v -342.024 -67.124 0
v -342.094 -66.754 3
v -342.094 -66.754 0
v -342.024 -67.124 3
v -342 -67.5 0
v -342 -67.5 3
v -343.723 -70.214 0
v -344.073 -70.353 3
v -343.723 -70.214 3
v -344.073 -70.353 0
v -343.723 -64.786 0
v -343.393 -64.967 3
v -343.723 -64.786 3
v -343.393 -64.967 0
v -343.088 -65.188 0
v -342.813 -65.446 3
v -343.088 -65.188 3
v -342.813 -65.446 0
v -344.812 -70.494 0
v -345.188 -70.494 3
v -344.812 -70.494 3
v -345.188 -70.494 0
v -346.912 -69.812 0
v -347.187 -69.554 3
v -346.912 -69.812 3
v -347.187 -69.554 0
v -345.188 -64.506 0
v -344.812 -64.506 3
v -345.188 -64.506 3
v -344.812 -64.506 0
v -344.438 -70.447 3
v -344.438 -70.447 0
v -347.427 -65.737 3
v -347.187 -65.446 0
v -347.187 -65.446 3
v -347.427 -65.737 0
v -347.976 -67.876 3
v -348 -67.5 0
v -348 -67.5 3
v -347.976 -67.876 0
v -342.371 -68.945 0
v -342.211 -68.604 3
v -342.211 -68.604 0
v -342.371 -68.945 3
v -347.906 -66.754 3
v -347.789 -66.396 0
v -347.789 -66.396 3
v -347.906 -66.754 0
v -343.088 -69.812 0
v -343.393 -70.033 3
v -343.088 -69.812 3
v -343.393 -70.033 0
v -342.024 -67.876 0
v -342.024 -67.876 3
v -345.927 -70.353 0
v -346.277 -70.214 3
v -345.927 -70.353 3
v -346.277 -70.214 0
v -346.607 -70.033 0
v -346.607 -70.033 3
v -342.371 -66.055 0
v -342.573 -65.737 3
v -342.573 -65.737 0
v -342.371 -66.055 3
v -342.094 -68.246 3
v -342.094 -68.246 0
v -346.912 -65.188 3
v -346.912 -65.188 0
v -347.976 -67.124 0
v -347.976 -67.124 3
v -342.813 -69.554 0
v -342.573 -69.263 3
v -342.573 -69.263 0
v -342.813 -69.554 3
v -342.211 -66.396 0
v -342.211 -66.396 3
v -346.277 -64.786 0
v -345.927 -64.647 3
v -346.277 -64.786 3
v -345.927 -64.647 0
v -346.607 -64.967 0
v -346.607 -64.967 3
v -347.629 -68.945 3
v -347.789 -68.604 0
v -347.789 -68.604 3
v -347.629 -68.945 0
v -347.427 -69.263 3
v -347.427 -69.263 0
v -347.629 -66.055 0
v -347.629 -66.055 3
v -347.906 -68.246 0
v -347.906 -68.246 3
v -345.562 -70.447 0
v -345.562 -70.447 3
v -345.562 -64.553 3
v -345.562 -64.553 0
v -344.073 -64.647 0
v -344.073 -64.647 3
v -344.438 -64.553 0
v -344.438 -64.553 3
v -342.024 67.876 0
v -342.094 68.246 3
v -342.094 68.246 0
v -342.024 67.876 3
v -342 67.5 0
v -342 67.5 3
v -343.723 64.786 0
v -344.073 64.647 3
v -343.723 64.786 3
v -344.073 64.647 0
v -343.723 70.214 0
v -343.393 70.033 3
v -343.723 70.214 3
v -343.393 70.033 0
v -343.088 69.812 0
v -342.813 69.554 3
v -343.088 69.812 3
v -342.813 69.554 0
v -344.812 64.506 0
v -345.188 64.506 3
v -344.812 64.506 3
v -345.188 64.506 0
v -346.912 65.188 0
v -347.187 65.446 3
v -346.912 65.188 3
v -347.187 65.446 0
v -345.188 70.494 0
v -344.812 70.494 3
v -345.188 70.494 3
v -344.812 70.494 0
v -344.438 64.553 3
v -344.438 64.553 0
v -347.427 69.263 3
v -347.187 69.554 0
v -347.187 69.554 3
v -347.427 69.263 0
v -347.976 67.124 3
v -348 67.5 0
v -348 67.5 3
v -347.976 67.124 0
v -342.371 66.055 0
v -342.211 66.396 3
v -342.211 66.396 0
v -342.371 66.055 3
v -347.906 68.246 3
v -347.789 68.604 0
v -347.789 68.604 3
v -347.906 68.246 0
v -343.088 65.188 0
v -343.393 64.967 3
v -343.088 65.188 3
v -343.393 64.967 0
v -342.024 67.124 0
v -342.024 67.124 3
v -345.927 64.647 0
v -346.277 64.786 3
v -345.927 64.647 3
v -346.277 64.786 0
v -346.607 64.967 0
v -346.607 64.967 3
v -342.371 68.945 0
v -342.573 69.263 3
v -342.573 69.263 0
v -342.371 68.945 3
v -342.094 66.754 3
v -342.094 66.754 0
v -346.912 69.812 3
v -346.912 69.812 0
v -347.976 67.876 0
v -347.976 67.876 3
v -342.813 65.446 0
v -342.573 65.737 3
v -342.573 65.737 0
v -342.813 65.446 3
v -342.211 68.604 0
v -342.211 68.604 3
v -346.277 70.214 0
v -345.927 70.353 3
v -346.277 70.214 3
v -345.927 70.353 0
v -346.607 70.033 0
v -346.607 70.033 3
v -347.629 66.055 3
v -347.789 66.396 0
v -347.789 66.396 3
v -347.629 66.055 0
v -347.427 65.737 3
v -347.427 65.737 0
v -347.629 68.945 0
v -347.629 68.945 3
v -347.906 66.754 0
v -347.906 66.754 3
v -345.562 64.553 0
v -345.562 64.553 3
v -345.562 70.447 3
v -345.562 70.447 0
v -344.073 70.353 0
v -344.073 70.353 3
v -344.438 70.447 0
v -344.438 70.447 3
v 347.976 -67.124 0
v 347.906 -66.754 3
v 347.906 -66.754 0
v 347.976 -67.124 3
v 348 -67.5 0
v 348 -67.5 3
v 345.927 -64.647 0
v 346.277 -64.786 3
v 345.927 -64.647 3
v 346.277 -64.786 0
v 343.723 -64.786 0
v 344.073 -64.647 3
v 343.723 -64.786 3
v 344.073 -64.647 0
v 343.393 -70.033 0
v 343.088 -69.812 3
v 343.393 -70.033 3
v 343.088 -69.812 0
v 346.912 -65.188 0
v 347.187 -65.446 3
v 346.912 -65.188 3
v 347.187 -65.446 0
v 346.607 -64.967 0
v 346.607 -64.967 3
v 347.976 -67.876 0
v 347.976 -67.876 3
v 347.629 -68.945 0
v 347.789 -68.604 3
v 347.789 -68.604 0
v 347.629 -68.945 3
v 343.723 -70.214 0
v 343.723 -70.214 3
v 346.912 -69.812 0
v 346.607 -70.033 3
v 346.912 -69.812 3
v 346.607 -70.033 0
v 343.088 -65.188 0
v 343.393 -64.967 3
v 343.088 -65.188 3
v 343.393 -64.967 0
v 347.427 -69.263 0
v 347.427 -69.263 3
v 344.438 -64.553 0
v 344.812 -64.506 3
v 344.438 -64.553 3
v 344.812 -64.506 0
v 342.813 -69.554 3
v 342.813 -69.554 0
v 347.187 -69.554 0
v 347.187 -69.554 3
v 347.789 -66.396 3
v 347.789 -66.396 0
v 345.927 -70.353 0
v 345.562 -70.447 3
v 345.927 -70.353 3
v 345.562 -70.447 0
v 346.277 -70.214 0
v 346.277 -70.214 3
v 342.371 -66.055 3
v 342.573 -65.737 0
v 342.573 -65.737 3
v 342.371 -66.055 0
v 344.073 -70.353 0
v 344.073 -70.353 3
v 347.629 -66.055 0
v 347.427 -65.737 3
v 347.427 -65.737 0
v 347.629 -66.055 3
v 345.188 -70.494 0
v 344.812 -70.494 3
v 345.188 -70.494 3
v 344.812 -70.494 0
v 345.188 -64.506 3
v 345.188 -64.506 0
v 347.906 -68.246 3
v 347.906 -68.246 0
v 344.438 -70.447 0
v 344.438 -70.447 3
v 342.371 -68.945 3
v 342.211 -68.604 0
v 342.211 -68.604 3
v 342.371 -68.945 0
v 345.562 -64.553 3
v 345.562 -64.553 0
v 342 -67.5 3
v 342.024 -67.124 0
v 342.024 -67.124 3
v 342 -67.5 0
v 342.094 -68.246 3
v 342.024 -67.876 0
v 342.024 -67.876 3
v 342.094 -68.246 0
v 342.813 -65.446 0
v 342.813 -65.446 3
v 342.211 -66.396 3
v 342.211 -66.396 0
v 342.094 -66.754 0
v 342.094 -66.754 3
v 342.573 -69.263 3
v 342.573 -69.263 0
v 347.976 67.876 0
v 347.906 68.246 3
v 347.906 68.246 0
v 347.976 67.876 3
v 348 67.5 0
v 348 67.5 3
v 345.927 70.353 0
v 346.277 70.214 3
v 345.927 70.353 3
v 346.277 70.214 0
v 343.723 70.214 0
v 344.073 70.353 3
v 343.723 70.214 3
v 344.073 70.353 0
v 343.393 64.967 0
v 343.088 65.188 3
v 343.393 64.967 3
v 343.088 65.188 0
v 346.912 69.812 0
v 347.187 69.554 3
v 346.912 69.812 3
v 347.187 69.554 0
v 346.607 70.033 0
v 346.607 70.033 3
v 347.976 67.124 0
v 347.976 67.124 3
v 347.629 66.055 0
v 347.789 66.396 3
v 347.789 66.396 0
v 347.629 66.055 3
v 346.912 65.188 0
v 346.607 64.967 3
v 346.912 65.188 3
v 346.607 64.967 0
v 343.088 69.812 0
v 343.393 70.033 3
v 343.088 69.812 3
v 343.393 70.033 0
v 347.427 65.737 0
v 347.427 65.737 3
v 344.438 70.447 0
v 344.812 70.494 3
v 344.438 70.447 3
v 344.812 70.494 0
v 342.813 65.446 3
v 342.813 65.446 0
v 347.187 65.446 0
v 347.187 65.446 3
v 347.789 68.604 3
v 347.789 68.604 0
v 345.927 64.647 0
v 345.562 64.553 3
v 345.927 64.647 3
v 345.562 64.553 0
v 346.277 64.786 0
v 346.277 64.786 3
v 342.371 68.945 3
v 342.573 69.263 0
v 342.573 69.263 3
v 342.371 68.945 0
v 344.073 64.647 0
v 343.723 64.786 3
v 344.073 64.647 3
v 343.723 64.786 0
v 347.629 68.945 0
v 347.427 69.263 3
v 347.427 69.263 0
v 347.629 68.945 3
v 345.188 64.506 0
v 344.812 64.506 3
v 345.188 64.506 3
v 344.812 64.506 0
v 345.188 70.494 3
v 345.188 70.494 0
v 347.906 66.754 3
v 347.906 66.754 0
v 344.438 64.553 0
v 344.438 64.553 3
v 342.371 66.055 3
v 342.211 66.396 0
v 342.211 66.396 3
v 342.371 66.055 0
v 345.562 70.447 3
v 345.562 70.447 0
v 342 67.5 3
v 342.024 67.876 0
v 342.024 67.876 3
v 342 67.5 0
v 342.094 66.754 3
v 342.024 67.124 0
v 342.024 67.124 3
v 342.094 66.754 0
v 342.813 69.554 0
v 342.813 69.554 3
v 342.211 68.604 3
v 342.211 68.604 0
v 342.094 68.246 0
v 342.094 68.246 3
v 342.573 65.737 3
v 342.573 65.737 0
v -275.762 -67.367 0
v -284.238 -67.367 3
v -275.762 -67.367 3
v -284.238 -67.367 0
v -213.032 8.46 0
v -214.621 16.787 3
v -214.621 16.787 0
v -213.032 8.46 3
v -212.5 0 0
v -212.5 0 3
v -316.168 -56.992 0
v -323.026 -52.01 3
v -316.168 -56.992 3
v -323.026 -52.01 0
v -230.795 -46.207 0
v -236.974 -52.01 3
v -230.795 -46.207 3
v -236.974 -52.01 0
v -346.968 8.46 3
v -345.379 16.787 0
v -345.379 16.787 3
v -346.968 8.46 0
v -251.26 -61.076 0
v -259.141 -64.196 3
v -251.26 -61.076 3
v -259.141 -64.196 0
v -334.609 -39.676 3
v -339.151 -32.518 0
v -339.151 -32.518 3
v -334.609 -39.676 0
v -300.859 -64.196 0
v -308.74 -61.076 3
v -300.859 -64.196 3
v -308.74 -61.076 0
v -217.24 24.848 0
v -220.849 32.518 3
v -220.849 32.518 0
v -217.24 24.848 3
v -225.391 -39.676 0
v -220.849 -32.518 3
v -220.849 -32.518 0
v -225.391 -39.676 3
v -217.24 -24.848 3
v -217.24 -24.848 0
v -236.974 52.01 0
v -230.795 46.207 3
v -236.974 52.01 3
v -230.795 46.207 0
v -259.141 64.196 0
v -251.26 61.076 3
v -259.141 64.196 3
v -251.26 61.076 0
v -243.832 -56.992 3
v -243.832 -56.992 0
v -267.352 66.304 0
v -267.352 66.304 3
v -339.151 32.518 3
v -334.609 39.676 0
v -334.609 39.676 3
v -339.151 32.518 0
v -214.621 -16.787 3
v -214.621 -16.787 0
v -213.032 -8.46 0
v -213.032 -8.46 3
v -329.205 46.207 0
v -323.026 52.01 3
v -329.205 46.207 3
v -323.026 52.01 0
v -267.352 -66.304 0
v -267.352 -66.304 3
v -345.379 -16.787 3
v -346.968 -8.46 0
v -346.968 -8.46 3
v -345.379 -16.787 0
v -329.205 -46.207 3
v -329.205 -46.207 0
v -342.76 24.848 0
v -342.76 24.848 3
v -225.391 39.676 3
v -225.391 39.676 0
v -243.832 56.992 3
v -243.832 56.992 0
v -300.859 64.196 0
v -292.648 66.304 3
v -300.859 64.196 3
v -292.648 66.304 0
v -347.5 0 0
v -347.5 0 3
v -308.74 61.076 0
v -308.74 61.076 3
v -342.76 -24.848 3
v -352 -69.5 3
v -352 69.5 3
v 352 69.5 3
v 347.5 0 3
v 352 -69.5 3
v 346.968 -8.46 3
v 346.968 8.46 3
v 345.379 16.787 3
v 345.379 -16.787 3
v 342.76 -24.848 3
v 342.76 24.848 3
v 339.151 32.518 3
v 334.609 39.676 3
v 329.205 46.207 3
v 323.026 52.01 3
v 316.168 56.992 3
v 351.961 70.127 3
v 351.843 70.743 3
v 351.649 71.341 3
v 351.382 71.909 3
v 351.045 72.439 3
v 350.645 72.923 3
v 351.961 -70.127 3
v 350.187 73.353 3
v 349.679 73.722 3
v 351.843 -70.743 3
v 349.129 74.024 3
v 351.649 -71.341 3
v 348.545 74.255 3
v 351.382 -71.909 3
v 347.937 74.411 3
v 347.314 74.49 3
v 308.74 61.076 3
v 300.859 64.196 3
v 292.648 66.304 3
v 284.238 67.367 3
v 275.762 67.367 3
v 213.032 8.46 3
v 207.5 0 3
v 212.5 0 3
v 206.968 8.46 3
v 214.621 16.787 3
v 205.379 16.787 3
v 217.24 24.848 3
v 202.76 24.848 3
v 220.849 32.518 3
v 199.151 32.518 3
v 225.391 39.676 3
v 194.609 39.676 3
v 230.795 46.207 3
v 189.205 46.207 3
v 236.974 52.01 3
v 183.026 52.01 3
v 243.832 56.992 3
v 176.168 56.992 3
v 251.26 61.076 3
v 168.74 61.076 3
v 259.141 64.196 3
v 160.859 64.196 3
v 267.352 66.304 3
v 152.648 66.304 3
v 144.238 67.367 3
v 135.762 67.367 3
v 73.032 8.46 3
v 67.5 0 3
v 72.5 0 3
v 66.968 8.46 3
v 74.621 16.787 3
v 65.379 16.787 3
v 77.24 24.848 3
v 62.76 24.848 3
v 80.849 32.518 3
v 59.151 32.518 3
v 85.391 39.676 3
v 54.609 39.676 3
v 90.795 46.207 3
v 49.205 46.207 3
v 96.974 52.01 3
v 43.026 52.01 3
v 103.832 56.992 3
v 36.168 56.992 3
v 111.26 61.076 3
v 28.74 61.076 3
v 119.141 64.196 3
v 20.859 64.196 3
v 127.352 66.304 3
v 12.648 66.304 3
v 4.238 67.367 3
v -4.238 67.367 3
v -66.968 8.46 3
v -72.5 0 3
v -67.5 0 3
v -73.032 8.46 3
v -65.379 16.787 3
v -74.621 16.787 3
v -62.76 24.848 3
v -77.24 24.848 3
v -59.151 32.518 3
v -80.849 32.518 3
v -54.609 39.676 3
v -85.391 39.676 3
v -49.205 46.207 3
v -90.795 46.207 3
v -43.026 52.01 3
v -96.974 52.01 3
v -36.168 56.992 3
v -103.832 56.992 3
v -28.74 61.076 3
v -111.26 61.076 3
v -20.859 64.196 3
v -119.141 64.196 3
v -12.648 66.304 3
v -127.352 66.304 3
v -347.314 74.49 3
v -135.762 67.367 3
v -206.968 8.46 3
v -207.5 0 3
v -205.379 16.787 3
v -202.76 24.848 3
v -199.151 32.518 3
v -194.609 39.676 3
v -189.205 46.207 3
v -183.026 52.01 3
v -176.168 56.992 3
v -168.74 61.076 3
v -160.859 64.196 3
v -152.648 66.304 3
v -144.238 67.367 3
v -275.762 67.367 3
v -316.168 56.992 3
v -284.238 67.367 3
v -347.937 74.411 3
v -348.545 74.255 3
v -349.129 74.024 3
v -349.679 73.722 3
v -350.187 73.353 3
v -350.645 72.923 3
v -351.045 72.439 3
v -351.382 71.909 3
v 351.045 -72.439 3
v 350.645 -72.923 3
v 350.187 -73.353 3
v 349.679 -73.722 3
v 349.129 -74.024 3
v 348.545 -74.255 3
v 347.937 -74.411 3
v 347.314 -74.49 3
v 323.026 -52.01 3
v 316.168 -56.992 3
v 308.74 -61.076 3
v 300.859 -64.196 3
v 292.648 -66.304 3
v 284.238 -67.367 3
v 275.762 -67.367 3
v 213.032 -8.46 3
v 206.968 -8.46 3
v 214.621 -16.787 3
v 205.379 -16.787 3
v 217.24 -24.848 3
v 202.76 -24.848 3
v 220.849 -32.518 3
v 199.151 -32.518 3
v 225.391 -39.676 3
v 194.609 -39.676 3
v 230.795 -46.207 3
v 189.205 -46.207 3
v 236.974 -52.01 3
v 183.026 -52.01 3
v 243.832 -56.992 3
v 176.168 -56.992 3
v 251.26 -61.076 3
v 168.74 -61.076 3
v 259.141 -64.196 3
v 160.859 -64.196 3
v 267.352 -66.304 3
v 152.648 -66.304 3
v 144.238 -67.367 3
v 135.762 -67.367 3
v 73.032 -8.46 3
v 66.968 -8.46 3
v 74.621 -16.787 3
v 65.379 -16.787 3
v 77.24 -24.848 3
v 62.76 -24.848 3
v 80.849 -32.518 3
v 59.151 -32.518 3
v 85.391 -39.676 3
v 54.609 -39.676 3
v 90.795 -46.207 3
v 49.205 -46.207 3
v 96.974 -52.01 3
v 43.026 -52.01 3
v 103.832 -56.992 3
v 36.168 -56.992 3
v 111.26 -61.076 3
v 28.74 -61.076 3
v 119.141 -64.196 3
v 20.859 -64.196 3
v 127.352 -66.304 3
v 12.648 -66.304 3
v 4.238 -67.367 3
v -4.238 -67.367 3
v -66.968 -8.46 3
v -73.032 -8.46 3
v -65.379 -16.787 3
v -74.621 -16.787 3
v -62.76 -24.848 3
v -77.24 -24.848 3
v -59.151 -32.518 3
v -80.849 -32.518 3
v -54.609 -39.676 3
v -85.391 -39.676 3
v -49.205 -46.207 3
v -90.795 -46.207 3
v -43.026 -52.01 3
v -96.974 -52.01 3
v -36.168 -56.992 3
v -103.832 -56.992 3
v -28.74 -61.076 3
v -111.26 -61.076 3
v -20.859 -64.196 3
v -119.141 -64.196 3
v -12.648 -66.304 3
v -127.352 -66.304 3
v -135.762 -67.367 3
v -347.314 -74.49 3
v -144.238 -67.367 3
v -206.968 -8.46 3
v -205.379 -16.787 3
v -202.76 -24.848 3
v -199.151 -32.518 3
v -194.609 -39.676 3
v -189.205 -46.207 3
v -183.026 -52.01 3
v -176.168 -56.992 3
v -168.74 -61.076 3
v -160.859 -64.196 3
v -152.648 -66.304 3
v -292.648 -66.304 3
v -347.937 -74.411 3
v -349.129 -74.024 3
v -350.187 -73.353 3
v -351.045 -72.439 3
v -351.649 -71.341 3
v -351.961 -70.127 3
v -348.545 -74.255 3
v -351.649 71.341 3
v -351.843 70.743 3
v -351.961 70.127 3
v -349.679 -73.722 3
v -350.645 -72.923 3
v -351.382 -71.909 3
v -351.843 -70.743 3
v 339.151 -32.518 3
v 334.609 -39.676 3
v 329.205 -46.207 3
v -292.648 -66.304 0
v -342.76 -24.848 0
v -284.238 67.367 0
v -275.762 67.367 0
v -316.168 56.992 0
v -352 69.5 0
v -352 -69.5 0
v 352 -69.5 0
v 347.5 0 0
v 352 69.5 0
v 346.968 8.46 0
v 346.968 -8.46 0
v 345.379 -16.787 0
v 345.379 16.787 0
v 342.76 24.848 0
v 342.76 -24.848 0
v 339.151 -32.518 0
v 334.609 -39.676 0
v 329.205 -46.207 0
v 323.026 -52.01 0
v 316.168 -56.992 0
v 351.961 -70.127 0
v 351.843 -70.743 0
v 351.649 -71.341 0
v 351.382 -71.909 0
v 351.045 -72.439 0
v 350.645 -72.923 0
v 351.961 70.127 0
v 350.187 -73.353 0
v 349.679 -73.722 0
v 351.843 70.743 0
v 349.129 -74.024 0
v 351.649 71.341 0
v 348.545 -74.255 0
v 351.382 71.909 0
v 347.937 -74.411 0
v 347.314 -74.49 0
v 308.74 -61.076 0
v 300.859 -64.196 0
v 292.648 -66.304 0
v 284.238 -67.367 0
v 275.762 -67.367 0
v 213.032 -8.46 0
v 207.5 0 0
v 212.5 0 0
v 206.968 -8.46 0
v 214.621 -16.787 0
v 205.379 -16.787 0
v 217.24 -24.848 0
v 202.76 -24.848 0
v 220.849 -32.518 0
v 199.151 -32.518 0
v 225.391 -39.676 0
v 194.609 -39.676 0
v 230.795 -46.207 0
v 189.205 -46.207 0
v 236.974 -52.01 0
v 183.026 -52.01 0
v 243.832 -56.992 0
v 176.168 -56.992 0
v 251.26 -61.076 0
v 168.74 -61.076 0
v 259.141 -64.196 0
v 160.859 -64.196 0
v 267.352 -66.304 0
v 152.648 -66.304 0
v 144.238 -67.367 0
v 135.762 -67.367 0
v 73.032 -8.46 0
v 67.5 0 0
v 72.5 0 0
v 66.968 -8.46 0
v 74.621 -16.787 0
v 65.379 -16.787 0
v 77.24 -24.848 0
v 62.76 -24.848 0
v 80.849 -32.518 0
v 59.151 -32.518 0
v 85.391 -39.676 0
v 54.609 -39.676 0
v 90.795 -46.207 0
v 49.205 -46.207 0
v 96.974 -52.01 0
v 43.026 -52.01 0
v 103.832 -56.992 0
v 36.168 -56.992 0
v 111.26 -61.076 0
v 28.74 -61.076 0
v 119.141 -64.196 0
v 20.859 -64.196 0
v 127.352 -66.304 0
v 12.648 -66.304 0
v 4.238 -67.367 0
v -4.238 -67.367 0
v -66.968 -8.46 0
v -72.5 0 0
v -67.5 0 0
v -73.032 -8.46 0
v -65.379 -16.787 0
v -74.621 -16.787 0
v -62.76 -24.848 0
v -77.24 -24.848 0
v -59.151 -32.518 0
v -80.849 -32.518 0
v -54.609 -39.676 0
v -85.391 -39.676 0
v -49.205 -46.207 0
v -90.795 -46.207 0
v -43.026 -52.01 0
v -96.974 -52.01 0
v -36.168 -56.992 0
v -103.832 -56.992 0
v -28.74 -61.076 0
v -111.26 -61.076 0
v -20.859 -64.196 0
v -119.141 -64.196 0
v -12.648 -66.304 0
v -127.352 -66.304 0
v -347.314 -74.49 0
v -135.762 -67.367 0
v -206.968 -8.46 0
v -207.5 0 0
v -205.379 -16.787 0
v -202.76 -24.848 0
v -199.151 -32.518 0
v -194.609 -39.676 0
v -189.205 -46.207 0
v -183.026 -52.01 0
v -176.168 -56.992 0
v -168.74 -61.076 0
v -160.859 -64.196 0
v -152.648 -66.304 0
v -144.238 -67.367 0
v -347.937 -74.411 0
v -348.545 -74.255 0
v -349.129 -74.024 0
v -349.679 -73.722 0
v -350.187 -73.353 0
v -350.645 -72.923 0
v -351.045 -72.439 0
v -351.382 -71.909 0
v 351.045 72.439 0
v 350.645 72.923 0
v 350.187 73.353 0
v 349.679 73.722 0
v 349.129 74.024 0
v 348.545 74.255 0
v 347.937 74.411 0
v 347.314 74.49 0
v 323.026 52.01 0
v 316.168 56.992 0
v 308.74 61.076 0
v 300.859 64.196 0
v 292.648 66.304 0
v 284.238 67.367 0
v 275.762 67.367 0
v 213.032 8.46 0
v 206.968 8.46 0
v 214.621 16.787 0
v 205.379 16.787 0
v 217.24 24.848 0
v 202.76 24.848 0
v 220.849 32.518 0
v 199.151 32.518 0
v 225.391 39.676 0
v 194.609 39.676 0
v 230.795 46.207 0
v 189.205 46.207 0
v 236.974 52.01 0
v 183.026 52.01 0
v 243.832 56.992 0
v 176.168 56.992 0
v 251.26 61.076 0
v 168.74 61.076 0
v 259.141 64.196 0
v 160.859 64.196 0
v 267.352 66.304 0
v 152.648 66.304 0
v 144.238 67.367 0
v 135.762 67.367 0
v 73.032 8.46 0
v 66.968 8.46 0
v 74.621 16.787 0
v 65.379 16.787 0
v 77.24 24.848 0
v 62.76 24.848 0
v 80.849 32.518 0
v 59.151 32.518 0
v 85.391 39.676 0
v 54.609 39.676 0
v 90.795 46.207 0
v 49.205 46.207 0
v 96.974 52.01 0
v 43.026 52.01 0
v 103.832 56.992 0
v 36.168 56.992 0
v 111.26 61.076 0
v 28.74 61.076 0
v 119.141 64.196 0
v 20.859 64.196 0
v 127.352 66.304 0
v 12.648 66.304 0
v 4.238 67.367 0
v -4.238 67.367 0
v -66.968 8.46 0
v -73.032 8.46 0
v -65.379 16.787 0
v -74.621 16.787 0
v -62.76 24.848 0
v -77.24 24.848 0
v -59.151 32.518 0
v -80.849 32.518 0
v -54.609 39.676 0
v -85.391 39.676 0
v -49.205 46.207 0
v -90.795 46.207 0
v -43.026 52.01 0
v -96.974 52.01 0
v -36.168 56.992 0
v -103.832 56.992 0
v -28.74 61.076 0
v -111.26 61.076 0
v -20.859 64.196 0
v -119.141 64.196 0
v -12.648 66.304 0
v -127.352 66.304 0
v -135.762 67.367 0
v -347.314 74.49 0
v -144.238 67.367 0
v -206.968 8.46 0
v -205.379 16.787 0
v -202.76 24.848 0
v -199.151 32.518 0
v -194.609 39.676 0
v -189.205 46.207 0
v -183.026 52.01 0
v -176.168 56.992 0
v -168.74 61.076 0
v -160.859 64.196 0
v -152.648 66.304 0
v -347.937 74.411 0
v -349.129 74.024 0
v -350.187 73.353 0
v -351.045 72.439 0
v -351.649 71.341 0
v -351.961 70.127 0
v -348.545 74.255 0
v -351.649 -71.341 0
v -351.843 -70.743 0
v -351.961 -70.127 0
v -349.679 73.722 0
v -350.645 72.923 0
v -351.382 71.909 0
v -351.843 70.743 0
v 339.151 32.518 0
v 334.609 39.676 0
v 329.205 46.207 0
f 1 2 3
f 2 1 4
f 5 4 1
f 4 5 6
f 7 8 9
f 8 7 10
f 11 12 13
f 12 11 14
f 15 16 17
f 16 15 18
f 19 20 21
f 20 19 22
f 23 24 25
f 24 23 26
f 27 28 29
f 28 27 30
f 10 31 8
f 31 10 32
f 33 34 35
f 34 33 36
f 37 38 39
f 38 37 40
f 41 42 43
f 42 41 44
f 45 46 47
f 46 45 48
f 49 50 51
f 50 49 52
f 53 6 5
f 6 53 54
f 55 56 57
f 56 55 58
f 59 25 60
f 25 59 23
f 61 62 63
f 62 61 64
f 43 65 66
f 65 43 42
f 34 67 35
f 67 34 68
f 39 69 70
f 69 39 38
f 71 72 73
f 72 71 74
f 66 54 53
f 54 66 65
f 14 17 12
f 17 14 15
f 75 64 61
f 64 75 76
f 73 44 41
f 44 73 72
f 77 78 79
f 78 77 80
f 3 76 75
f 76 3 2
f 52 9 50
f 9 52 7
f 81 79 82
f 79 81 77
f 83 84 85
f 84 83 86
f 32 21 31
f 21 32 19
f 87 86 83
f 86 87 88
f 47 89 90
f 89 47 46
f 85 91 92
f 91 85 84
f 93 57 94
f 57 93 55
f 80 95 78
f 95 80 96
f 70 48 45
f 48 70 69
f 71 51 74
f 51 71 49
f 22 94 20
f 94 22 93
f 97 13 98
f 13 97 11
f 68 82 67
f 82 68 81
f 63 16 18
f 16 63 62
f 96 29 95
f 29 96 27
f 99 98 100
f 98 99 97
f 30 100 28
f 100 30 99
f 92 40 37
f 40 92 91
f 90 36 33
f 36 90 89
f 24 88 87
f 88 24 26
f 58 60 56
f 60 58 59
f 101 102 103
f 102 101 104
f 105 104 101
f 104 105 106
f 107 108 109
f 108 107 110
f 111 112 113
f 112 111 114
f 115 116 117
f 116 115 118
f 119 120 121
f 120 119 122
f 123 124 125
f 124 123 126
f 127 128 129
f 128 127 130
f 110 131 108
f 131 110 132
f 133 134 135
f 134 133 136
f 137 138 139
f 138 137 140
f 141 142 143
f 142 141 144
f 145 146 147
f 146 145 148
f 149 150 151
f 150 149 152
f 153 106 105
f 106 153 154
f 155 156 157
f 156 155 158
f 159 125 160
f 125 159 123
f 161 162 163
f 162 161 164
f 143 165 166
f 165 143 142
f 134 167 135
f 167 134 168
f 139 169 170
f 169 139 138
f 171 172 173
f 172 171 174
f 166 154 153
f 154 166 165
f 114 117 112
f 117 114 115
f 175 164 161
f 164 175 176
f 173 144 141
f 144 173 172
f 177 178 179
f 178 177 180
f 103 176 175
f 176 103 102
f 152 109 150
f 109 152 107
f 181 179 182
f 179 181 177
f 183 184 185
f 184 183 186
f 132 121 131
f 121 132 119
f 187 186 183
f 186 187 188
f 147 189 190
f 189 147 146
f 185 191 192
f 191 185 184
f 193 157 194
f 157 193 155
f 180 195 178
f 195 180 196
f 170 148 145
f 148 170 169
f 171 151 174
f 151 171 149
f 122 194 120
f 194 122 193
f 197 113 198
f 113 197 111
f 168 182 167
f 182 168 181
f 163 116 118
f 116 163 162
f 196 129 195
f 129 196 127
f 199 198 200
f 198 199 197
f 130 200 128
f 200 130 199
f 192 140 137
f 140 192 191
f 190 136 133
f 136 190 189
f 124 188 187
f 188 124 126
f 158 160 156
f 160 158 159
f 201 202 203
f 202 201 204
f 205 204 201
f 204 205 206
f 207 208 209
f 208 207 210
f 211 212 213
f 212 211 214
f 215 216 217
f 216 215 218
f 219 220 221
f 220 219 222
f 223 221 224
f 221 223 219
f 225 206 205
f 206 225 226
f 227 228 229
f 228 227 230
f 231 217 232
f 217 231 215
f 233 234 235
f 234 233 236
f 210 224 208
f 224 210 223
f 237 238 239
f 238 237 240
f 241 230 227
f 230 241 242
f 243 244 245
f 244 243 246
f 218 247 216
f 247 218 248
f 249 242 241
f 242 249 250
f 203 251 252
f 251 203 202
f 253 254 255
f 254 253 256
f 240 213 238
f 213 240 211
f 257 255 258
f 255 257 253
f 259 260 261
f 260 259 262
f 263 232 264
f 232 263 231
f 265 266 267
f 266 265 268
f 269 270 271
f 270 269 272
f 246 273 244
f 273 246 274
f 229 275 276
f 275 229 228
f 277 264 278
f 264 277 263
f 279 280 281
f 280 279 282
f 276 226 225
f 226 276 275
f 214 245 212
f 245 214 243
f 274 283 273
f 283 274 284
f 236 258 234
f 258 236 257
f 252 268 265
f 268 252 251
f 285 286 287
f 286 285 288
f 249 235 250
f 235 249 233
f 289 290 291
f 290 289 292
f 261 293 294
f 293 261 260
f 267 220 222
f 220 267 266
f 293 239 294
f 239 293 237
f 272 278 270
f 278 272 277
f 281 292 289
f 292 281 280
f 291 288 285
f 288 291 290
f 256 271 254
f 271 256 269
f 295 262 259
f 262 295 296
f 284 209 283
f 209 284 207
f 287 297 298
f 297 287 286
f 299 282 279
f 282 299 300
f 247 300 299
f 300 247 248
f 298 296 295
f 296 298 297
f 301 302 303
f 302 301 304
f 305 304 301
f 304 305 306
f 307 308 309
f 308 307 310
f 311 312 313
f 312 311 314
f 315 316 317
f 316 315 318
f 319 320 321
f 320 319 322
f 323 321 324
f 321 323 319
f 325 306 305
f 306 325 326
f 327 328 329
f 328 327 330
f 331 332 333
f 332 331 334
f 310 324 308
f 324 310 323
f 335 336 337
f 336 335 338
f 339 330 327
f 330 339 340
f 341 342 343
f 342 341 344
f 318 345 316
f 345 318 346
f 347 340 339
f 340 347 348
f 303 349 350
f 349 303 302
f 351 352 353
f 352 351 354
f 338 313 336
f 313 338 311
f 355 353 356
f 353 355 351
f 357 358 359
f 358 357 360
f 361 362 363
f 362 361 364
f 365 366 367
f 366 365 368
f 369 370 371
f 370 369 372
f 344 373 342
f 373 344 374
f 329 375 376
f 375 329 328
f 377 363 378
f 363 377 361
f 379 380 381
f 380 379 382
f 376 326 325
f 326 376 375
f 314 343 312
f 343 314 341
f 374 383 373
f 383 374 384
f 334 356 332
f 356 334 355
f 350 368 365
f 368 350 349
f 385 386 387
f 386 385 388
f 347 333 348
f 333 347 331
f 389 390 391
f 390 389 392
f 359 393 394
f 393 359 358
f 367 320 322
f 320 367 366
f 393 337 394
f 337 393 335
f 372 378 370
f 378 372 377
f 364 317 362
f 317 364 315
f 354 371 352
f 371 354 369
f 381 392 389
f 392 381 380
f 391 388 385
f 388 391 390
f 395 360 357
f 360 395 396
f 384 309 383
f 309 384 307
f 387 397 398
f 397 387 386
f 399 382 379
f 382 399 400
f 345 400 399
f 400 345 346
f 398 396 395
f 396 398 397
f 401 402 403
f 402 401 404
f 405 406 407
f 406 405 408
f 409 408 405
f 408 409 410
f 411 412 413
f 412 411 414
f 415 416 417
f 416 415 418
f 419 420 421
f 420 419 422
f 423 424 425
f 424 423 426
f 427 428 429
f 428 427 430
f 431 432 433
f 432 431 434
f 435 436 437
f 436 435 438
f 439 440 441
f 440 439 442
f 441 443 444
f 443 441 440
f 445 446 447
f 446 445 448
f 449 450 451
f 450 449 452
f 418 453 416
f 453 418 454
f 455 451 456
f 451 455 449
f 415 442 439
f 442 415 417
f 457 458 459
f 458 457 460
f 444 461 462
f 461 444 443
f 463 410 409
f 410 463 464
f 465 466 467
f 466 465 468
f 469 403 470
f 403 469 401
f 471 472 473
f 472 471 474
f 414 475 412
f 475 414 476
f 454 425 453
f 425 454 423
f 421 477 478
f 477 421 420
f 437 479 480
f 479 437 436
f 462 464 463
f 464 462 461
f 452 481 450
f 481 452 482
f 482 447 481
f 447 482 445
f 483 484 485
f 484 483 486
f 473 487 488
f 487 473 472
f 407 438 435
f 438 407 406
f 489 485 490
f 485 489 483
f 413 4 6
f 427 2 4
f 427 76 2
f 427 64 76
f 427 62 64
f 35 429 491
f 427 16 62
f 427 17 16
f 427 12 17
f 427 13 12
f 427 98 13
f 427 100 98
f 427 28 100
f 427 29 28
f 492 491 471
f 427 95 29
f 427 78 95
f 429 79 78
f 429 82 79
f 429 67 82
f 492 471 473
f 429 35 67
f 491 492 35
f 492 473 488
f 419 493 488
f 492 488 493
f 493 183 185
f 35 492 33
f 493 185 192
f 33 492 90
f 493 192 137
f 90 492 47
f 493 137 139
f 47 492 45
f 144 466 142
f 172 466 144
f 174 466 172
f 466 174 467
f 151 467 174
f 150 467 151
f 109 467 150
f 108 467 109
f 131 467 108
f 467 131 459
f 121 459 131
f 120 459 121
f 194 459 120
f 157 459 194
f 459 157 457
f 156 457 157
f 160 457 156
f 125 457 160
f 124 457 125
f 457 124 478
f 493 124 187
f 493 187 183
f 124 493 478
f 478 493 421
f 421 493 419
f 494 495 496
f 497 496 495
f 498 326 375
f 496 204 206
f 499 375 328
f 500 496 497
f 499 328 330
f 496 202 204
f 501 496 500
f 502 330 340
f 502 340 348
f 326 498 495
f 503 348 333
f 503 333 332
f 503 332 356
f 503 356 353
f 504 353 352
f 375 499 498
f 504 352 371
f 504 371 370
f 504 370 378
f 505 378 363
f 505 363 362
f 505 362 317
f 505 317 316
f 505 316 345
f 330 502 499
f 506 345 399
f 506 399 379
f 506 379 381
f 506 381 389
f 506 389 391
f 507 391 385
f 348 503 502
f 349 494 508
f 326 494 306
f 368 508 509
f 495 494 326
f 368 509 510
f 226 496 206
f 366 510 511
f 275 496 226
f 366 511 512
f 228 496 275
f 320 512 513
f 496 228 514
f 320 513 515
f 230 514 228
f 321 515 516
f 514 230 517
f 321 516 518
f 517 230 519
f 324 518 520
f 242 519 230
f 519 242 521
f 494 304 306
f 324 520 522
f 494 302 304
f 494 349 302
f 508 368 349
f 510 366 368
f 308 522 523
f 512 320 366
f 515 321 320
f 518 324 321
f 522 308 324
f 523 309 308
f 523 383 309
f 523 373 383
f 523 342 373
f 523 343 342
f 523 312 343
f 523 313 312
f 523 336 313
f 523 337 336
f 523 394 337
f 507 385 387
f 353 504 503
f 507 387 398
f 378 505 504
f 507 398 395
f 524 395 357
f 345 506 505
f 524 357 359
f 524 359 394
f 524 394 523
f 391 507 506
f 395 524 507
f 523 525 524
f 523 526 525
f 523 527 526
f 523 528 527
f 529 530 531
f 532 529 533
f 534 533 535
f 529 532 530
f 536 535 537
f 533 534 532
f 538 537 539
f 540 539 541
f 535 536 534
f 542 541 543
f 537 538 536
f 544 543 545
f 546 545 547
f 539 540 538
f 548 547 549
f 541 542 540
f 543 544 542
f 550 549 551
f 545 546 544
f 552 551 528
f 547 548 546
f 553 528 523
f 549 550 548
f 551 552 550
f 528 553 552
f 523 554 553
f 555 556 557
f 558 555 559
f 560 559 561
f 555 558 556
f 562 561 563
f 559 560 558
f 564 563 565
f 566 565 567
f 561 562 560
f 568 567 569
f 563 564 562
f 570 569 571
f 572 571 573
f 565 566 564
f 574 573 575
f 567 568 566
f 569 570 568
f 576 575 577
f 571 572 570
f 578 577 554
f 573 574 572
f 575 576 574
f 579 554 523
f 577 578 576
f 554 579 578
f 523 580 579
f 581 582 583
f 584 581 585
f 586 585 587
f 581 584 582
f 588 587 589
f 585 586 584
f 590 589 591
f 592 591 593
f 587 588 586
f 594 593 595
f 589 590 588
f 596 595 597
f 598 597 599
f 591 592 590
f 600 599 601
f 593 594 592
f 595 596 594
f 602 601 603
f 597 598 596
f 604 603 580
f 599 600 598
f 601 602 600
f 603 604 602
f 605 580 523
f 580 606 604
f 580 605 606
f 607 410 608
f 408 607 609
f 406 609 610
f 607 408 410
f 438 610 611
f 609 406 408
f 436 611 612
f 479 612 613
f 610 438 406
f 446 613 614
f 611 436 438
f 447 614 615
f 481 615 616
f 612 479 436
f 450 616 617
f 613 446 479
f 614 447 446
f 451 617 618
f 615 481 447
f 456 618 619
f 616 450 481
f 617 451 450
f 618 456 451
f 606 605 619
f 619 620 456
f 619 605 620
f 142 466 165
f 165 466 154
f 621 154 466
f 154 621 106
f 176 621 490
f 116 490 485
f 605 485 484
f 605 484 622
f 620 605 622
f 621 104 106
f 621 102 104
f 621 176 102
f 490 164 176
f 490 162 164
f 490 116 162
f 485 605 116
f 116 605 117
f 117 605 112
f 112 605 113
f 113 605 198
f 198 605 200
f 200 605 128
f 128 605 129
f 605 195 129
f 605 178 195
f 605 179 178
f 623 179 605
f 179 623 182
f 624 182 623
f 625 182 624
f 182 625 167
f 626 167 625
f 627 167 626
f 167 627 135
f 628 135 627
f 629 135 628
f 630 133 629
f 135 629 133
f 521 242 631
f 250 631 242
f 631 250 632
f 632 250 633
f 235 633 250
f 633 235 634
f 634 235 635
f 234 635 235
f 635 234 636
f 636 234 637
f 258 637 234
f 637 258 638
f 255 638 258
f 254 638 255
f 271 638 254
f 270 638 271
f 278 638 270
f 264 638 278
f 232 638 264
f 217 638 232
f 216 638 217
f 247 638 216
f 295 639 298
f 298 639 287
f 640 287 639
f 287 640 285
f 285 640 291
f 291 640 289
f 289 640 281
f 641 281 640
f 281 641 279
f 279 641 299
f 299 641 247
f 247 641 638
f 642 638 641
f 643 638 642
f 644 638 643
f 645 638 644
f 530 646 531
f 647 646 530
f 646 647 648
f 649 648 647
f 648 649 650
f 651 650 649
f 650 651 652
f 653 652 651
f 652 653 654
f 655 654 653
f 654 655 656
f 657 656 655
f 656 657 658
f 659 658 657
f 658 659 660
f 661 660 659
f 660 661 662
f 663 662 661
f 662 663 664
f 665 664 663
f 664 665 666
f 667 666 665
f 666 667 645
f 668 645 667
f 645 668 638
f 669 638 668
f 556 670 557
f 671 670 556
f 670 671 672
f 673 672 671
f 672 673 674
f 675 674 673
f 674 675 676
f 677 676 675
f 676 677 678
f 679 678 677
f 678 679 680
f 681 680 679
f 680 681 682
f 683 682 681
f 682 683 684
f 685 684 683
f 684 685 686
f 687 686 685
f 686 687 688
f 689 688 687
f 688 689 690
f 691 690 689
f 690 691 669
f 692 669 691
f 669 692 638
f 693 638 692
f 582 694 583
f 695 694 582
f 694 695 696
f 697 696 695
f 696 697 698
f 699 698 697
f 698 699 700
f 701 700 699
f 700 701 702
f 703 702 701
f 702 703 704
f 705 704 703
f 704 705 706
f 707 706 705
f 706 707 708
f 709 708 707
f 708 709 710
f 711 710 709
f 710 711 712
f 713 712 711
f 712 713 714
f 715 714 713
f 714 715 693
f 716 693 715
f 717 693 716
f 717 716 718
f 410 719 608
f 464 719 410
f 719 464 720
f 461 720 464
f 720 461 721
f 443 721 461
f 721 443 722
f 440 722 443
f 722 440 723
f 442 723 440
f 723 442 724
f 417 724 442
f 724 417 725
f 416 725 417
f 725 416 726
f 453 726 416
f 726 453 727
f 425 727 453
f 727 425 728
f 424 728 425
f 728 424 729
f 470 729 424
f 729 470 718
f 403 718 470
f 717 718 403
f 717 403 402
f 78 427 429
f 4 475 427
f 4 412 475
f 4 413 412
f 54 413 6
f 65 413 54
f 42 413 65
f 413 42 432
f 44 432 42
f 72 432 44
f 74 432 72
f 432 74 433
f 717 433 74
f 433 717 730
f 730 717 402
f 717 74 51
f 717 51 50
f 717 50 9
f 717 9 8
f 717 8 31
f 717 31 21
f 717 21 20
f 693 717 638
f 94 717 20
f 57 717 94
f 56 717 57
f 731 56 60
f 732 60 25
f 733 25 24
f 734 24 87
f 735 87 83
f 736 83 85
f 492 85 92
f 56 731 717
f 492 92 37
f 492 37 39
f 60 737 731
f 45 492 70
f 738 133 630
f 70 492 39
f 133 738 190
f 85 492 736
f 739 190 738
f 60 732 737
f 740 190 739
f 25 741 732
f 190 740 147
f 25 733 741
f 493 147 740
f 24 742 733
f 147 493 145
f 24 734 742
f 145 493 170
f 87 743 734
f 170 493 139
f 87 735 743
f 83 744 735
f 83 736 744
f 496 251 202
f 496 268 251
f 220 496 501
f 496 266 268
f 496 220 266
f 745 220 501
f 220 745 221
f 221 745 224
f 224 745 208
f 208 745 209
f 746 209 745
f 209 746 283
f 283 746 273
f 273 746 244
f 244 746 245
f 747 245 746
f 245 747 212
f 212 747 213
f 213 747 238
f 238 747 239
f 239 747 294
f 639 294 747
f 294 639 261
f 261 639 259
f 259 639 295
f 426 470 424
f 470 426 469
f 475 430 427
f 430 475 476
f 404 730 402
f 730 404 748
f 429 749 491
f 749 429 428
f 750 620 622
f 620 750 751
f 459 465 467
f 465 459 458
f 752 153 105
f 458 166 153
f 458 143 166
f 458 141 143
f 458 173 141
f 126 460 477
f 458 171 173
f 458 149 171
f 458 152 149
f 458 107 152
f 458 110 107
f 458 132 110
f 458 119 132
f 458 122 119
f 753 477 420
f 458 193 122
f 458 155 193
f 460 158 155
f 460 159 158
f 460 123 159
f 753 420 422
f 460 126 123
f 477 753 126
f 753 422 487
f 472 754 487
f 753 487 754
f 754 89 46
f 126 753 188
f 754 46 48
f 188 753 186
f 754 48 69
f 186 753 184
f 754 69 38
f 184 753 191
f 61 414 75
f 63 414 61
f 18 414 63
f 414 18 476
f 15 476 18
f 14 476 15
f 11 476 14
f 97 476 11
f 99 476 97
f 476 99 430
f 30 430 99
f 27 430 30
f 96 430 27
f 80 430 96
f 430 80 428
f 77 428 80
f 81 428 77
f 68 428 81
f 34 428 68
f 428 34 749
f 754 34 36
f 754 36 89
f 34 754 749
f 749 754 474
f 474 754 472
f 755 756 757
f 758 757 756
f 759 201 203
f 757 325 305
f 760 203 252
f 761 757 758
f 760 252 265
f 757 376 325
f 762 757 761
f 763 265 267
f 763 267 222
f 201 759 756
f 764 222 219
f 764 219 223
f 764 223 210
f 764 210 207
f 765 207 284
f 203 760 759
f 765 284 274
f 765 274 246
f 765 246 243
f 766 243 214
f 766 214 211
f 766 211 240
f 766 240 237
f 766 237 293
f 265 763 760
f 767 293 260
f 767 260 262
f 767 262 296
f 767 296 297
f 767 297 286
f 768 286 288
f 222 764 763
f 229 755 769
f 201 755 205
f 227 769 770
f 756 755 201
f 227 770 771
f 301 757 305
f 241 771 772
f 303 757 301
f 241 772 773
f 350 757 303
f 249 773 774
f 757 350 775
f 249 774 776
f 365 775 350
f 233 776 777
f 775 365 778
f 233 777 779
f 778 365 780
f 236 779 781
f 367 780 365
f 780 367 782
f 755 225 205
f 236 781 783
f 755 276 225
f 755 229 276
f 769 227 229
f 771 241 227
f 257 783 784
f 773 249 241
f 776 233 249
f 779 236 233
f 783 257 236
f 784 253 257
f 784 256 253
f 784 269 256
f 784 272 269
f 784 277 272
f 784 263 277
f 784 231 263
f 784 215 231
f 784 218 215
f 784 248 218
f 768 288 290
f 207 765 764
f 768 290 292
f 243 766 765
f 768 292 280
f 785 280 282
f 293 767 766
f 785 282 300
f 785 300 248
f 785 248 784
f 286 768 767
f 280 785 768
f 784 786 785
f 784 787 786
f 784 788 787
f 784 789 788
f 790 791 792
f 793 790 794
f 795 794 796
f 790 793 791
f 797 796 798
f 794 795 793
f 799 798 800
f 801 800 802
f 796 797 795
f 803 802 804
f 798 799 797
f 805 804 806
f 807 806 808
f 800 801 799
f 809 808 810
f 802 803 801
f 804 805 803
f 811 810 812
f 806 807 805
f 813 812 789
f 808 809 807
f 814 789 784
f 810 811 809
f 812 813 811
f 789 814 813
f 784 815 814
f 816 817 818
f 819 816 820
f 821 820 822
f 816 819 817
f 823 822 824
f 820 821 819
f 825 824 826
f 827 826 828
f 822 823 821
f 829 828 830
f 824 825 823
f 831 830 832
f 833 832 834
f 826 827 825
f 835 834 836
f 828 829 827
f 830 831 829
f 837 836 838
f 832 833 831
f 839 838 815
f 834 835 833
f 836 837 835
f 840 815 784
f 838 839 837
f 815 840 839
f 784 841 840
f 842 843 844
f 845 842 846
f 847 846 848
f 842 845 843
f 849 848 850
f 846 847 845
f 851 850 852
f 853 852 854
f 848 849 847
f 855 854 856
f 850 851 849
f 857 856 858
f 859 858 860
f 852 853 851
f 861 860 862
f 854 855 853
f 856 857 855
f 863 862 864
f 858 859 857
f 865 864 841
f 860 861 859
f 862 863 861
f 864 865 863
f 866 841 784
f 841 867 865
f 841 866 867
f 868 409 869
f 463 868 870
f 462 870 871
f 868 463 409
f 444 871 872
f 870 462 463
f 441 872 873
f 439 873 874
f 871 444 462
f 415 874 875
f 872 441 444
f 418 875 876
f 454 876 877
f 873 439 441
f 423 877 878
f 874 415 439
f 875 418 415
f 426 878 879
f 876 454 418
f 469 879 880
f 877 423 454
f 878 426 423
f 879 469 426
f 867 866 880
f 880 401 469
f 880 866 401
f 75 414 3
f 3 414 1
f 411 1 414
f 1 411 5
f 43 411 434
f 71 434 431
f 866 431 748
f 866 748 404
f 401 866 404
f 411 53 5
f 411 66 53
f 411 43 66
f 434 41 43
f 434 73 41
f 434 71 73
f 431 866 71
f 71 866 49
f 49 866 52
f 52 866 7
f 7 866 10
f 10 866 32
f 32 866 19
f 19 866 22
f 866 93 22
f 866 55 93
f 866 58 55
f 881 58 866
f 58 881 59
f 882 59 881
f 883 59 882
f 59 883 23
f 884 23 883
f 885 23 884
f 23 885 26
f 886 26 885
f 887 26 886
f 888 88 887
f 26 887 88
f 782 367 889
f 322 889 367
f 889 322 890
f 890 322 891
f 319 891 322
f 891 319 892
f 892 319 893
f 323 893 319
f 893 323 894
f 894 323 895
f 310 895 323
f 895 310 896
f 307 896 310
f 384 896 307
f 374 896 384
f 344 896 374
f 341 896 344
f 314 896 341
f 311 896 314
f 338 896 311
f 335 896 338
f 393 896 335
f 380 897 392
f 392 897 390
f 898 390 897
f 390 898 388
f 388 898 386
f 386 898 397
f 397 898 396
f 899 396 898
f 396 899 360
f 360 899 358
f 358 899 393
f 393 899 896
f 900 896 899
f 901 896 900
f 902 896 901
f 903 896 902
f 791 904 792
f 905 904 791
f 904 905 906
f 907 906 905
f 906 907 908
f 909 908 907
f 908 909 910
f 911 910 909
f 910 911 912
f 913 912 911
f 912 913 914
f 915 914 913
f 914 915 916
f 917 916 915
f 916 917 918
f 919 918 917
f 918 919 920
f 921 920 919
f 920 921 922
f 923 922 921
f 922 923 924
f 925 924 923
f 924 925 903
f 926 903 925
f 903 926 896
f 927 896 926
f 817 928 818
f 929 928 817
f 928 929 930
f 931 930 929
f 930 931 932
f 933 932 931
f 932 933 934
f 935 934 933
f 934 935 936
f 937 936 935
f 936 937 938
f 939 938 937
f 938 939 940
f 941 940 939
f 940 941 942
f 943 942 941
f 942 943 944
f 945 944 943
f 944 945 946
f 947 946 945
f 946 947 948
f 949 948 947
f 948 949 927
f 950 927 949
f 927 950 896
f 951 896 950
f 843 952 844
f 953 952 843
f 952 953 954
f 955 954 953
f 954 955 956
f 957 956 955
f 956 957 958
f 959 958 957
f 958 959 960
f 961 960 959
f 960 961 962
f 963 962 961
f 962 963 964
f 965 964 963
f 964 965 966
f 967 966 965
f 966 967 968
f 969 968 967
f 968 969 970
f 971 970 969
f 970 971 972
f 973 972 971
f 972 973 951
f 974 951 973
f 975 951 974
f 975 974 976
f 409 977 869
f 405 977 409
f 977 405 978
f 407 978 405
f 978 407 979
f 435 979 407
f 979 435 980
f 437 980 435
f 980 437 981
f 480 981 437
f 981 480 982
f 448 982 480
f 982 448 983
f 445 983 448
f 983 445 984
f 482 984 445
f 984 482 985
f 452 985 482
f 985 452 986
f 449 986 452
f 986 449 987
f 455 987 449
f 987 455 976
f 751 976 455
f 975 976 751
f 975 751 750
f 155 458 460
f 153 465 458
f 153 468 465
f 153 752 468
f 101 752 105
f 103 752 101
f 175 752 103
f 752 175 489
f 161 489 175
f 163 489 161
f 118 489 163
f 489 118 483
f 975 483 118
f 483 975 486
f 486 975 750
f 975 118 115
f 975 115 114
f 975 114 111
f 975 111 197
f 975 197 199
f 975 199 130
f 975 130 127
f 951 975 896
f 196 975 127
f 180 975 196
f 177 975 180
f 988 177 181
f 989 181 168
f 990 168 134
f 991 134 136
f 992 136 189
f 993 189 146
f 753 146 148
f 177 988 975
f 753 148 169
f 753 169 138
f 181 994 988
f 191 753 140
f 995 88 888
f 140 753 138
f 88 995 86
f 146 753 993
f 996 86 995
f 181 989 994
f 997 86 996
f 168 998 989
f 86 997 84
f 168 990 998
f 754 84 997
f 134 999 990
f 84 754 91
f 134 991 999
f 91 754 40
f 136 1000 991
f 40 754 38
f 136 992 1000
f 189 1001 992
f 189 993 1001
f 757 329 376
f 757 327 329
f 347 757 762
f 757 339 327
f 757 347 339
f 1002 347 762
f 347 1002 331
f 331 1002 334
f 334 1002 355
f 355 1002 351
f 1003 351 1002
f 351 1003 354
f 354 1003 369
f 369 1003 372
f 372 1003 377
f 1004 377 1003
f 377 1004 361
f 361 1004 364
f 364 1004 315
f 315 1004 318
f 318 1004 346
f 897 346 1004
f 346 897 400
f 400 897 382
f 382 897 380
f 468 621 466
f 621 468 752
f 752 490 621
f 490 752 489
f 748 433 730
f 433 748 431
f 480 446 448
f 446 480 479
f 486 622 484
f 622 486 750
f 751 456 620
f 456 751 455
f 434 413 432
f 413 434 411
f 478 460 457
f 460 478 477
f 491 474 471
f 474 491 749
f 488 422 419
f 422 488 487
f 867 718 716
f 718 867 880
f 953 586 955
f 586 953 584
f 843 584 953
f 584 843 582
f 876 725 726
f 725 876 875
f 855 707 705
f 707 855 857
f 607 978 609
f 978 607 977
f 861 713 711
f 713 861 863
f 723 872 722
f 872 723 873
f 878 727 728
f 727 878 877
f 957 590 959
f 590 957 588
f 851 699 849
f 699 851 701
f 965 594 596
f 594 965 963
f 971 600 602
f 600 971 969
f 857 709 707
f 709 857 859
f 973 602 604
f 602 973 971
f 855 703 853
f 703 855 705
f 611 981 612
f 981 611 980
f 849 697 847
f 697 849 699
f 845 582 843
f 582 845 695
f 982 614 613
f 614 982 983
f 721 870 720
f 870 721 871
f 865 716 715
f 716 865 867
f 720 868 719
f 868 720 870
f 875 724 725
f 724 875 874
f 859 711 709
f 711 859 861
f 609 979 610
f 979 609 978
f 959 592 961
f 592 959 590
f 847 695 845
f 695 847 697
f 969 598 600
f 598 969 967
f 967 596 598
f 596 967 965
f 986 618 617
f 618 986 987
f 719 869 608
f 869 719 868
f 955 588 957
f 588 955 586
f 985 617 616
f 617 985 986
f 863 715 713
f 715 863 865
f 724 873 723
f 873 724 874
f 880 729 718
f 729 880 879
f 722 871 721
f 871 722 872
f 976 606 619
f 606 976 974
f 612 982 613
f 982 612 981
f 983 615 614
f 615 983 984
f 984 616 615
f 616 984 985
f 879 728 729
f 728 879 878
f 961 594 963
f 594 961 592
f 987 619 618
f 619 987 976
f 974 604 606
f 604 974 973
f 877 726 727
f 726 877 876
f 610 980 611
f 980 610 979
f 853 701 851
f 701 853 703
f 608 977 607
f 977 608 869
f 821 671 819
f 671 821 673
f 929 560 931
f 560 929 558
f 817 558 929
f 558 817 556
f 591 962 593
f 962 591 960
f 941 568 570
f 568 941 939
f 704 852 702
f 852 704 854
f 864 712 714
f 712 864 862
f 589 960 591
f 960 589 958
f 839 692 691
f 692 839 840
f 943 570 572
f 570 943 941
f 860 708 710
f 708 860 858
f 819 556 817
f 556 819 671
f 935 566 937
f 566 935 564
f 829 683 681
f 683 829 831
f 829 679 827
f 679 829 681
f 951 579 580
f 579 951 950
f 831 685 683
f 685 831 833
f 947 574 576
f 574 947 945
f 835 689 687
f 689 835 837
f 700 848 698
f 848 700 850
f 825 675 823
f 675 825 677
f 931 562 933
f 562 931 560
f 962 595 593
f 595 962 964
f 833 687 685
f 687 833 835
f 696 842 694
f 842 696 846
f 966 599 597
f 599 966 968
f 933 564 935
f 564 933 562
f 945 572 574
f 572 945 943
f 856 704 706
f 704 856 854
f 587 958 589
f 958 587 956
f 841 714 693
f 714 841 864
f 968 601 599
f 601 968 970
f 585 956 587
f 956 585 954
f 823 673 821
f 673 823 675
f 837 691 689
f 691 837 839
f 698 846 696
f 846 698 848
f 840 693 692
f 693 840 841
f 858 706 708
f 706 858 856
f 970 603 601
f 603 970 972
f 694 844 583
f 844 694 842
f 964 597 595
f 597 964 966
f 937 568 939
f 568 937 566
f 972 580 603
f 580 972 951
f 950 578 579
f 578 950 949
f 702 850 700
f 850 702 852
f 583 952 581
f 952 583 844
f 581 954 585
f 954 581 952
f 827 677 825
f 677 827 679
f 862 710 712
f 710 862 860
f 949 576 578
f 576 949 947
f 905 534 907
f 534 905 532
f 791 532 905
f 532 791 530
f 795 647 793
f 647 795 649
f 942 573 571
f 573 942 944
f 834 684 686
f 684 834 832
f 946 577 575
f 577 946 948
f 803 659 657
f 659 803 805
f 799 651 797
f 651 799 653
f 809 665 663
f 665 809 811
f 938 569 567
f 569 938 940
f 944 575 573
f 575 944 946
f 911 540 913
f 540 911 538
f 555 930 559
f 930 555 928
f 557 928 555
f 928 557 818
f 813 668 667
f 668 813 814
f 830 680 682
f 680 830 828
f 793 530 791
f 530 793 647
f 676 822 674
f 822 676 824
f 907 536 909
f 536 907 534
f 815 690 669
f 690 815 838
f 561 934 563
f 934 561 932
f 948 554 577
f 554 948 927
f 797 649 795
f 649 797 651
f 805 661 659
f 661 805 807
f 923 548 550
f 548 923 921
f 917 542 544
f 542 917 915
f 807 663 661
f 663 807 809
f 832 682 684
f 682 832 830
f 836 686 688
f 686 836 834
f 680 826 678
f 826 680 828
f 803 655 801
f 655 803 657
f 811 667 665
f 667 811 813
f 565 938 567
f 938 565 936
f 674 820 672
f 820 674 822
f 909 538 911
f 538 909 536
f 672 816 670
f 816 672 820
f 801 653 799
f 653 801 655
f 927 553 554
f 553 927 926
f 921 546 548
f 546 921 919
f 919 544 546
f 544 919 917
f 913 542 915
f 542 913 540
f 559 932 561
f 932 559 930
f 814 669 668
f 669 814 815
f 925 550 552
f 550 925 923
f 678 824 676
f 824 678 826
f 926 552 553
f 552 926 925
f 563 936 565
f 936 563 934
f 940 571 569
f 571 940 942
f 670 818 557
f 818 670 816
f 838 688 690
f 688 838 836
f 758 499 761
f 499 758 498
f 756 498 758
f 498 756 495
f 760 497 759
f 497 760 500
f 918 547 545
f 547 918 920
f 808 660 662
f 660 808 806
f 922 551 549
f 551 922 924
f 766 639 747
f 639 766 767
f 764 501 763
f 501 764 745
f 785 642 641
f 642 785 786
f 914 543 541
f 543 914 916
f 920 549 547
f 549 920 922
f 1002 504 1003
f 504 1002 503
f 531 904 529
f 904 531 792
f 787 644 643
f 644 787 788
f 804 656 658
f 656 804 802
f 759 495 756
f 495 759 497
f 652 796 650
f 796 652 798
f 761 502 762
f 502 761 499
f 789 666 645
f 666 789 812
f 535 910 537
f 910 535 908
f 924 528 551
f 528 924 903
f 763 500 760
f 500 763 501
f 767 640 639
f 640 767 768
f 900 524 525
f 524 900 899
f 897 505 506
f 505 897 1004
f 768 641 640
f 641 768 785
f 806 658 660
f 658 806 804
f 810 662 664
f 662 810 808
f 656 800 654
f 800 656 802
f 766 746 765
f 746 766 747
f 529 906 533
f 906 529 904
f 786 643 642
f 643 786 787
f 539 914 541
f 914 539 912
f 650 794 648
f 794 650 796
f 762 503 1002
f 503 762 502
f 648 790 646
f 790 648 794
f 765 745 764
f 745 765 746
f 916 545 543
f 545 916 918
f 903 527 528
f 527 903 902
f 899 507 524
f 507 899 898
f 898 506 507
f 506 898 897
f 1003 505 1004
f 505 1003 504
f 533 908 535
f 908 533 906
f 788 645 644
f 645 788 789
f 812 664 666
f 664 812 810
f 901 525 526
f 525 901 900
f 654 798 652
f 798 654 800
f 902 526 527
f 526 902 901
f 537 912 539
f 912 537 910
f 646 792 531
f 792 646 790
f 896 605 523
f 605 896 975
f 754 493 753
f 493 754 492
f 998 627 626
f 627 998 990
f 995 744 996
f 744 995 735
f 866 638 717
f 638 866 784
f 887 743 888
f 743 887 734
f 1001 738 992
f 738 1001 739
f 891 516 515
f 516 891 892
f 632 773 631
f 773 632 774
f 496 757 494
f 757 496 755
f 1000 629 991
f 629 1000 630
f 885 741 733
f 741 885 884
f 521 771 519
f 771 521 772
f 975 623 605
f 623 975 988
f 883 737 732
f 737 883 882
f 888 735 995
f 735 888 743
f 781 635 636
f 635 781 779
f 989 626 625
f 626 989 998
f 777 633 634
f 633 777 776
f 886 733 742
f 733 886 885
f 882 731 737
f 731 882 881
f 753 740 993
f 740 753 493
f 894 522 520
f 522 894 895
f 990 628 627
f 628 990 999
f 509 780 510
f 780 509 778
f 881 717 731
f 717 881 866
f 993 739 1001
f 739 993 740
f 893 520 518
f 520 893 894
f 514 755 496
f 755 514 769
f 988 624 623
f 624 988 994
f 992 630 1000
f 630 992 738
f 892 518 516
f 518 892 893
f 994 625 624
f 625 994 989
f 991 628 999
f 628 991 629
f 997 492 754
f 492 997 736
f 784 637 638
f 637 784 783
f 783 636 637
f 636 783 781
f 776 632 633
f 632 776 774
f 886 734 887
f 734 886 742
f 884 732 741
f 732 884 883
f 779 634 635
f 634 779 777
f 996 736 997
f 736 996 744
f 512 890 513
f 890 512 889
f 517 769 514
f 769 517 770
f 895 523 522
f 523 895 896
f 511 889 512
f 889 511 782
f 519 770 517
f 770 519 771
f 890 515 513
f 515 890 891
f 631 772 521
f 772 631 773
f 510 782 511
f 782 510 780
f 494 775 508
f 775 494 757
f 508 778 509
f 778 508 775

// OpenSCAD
$fn = 50;


difference() {
	union() {
		hull() {
			translate(v = [-347.0000000000, 69.5000000000, 0]) {
				cylinder(h = 3, r = 5);
			}
			translate(v = [347.0000000000, 69.5000000000, 0]) {
				cylinder(h = 3, r = 5);
			}
			translate(v = [-347.0000000000, -69.5000000000, 0]) {
				cylinder(h = 3, r = 5);
			}
			translate(v = [347.0000000000, -69.5000000000, 0]) {
				cylinder(h = 3, r = 5);
			}
		}
	}
	union() {
		#translate(v = [-345.0000000000, -67.5000000000, -100.0000000000]) {
			cylinder(h = 200, r = 3.0000000000);
		}
		#translate(v = [-345.0000000000, 67.5000000000, -100.0000000000]) {
			cylinder(h = 200, r = 3.0000000000);
		}
		#translate(v = [345.0000000000, -67.5000000000, -100.0000000000]) {
			cylinder(h = 200, r = 3.0000000000);
		}
		#translate(v = [345.0000000000, 67.5000000000, -100.0000000000]) {
			cylinder(h = 200, r = 3.0000000000);
		}
		#translate(v = [-280.0000000000, 0, 0]) {
			cylinder(h = 3, r = 67.5000000000);
		}
		#translate(v = [-140.0000000000, 0, 0]) {
			cylinder(h = 3, r = 67.5000000000);
		}
		#cylinder(h = 3, r = 67.5000000000);
		#translate(v = [140.0000000000, 0, 0]) {
			cylinder(h = 3, r = 67.5000000000);
		}
		#translate(v = [280.0000000000, 0, 0]) {
			cylinder(h = 3, r = 67.5000000000);
		}
	}
}
